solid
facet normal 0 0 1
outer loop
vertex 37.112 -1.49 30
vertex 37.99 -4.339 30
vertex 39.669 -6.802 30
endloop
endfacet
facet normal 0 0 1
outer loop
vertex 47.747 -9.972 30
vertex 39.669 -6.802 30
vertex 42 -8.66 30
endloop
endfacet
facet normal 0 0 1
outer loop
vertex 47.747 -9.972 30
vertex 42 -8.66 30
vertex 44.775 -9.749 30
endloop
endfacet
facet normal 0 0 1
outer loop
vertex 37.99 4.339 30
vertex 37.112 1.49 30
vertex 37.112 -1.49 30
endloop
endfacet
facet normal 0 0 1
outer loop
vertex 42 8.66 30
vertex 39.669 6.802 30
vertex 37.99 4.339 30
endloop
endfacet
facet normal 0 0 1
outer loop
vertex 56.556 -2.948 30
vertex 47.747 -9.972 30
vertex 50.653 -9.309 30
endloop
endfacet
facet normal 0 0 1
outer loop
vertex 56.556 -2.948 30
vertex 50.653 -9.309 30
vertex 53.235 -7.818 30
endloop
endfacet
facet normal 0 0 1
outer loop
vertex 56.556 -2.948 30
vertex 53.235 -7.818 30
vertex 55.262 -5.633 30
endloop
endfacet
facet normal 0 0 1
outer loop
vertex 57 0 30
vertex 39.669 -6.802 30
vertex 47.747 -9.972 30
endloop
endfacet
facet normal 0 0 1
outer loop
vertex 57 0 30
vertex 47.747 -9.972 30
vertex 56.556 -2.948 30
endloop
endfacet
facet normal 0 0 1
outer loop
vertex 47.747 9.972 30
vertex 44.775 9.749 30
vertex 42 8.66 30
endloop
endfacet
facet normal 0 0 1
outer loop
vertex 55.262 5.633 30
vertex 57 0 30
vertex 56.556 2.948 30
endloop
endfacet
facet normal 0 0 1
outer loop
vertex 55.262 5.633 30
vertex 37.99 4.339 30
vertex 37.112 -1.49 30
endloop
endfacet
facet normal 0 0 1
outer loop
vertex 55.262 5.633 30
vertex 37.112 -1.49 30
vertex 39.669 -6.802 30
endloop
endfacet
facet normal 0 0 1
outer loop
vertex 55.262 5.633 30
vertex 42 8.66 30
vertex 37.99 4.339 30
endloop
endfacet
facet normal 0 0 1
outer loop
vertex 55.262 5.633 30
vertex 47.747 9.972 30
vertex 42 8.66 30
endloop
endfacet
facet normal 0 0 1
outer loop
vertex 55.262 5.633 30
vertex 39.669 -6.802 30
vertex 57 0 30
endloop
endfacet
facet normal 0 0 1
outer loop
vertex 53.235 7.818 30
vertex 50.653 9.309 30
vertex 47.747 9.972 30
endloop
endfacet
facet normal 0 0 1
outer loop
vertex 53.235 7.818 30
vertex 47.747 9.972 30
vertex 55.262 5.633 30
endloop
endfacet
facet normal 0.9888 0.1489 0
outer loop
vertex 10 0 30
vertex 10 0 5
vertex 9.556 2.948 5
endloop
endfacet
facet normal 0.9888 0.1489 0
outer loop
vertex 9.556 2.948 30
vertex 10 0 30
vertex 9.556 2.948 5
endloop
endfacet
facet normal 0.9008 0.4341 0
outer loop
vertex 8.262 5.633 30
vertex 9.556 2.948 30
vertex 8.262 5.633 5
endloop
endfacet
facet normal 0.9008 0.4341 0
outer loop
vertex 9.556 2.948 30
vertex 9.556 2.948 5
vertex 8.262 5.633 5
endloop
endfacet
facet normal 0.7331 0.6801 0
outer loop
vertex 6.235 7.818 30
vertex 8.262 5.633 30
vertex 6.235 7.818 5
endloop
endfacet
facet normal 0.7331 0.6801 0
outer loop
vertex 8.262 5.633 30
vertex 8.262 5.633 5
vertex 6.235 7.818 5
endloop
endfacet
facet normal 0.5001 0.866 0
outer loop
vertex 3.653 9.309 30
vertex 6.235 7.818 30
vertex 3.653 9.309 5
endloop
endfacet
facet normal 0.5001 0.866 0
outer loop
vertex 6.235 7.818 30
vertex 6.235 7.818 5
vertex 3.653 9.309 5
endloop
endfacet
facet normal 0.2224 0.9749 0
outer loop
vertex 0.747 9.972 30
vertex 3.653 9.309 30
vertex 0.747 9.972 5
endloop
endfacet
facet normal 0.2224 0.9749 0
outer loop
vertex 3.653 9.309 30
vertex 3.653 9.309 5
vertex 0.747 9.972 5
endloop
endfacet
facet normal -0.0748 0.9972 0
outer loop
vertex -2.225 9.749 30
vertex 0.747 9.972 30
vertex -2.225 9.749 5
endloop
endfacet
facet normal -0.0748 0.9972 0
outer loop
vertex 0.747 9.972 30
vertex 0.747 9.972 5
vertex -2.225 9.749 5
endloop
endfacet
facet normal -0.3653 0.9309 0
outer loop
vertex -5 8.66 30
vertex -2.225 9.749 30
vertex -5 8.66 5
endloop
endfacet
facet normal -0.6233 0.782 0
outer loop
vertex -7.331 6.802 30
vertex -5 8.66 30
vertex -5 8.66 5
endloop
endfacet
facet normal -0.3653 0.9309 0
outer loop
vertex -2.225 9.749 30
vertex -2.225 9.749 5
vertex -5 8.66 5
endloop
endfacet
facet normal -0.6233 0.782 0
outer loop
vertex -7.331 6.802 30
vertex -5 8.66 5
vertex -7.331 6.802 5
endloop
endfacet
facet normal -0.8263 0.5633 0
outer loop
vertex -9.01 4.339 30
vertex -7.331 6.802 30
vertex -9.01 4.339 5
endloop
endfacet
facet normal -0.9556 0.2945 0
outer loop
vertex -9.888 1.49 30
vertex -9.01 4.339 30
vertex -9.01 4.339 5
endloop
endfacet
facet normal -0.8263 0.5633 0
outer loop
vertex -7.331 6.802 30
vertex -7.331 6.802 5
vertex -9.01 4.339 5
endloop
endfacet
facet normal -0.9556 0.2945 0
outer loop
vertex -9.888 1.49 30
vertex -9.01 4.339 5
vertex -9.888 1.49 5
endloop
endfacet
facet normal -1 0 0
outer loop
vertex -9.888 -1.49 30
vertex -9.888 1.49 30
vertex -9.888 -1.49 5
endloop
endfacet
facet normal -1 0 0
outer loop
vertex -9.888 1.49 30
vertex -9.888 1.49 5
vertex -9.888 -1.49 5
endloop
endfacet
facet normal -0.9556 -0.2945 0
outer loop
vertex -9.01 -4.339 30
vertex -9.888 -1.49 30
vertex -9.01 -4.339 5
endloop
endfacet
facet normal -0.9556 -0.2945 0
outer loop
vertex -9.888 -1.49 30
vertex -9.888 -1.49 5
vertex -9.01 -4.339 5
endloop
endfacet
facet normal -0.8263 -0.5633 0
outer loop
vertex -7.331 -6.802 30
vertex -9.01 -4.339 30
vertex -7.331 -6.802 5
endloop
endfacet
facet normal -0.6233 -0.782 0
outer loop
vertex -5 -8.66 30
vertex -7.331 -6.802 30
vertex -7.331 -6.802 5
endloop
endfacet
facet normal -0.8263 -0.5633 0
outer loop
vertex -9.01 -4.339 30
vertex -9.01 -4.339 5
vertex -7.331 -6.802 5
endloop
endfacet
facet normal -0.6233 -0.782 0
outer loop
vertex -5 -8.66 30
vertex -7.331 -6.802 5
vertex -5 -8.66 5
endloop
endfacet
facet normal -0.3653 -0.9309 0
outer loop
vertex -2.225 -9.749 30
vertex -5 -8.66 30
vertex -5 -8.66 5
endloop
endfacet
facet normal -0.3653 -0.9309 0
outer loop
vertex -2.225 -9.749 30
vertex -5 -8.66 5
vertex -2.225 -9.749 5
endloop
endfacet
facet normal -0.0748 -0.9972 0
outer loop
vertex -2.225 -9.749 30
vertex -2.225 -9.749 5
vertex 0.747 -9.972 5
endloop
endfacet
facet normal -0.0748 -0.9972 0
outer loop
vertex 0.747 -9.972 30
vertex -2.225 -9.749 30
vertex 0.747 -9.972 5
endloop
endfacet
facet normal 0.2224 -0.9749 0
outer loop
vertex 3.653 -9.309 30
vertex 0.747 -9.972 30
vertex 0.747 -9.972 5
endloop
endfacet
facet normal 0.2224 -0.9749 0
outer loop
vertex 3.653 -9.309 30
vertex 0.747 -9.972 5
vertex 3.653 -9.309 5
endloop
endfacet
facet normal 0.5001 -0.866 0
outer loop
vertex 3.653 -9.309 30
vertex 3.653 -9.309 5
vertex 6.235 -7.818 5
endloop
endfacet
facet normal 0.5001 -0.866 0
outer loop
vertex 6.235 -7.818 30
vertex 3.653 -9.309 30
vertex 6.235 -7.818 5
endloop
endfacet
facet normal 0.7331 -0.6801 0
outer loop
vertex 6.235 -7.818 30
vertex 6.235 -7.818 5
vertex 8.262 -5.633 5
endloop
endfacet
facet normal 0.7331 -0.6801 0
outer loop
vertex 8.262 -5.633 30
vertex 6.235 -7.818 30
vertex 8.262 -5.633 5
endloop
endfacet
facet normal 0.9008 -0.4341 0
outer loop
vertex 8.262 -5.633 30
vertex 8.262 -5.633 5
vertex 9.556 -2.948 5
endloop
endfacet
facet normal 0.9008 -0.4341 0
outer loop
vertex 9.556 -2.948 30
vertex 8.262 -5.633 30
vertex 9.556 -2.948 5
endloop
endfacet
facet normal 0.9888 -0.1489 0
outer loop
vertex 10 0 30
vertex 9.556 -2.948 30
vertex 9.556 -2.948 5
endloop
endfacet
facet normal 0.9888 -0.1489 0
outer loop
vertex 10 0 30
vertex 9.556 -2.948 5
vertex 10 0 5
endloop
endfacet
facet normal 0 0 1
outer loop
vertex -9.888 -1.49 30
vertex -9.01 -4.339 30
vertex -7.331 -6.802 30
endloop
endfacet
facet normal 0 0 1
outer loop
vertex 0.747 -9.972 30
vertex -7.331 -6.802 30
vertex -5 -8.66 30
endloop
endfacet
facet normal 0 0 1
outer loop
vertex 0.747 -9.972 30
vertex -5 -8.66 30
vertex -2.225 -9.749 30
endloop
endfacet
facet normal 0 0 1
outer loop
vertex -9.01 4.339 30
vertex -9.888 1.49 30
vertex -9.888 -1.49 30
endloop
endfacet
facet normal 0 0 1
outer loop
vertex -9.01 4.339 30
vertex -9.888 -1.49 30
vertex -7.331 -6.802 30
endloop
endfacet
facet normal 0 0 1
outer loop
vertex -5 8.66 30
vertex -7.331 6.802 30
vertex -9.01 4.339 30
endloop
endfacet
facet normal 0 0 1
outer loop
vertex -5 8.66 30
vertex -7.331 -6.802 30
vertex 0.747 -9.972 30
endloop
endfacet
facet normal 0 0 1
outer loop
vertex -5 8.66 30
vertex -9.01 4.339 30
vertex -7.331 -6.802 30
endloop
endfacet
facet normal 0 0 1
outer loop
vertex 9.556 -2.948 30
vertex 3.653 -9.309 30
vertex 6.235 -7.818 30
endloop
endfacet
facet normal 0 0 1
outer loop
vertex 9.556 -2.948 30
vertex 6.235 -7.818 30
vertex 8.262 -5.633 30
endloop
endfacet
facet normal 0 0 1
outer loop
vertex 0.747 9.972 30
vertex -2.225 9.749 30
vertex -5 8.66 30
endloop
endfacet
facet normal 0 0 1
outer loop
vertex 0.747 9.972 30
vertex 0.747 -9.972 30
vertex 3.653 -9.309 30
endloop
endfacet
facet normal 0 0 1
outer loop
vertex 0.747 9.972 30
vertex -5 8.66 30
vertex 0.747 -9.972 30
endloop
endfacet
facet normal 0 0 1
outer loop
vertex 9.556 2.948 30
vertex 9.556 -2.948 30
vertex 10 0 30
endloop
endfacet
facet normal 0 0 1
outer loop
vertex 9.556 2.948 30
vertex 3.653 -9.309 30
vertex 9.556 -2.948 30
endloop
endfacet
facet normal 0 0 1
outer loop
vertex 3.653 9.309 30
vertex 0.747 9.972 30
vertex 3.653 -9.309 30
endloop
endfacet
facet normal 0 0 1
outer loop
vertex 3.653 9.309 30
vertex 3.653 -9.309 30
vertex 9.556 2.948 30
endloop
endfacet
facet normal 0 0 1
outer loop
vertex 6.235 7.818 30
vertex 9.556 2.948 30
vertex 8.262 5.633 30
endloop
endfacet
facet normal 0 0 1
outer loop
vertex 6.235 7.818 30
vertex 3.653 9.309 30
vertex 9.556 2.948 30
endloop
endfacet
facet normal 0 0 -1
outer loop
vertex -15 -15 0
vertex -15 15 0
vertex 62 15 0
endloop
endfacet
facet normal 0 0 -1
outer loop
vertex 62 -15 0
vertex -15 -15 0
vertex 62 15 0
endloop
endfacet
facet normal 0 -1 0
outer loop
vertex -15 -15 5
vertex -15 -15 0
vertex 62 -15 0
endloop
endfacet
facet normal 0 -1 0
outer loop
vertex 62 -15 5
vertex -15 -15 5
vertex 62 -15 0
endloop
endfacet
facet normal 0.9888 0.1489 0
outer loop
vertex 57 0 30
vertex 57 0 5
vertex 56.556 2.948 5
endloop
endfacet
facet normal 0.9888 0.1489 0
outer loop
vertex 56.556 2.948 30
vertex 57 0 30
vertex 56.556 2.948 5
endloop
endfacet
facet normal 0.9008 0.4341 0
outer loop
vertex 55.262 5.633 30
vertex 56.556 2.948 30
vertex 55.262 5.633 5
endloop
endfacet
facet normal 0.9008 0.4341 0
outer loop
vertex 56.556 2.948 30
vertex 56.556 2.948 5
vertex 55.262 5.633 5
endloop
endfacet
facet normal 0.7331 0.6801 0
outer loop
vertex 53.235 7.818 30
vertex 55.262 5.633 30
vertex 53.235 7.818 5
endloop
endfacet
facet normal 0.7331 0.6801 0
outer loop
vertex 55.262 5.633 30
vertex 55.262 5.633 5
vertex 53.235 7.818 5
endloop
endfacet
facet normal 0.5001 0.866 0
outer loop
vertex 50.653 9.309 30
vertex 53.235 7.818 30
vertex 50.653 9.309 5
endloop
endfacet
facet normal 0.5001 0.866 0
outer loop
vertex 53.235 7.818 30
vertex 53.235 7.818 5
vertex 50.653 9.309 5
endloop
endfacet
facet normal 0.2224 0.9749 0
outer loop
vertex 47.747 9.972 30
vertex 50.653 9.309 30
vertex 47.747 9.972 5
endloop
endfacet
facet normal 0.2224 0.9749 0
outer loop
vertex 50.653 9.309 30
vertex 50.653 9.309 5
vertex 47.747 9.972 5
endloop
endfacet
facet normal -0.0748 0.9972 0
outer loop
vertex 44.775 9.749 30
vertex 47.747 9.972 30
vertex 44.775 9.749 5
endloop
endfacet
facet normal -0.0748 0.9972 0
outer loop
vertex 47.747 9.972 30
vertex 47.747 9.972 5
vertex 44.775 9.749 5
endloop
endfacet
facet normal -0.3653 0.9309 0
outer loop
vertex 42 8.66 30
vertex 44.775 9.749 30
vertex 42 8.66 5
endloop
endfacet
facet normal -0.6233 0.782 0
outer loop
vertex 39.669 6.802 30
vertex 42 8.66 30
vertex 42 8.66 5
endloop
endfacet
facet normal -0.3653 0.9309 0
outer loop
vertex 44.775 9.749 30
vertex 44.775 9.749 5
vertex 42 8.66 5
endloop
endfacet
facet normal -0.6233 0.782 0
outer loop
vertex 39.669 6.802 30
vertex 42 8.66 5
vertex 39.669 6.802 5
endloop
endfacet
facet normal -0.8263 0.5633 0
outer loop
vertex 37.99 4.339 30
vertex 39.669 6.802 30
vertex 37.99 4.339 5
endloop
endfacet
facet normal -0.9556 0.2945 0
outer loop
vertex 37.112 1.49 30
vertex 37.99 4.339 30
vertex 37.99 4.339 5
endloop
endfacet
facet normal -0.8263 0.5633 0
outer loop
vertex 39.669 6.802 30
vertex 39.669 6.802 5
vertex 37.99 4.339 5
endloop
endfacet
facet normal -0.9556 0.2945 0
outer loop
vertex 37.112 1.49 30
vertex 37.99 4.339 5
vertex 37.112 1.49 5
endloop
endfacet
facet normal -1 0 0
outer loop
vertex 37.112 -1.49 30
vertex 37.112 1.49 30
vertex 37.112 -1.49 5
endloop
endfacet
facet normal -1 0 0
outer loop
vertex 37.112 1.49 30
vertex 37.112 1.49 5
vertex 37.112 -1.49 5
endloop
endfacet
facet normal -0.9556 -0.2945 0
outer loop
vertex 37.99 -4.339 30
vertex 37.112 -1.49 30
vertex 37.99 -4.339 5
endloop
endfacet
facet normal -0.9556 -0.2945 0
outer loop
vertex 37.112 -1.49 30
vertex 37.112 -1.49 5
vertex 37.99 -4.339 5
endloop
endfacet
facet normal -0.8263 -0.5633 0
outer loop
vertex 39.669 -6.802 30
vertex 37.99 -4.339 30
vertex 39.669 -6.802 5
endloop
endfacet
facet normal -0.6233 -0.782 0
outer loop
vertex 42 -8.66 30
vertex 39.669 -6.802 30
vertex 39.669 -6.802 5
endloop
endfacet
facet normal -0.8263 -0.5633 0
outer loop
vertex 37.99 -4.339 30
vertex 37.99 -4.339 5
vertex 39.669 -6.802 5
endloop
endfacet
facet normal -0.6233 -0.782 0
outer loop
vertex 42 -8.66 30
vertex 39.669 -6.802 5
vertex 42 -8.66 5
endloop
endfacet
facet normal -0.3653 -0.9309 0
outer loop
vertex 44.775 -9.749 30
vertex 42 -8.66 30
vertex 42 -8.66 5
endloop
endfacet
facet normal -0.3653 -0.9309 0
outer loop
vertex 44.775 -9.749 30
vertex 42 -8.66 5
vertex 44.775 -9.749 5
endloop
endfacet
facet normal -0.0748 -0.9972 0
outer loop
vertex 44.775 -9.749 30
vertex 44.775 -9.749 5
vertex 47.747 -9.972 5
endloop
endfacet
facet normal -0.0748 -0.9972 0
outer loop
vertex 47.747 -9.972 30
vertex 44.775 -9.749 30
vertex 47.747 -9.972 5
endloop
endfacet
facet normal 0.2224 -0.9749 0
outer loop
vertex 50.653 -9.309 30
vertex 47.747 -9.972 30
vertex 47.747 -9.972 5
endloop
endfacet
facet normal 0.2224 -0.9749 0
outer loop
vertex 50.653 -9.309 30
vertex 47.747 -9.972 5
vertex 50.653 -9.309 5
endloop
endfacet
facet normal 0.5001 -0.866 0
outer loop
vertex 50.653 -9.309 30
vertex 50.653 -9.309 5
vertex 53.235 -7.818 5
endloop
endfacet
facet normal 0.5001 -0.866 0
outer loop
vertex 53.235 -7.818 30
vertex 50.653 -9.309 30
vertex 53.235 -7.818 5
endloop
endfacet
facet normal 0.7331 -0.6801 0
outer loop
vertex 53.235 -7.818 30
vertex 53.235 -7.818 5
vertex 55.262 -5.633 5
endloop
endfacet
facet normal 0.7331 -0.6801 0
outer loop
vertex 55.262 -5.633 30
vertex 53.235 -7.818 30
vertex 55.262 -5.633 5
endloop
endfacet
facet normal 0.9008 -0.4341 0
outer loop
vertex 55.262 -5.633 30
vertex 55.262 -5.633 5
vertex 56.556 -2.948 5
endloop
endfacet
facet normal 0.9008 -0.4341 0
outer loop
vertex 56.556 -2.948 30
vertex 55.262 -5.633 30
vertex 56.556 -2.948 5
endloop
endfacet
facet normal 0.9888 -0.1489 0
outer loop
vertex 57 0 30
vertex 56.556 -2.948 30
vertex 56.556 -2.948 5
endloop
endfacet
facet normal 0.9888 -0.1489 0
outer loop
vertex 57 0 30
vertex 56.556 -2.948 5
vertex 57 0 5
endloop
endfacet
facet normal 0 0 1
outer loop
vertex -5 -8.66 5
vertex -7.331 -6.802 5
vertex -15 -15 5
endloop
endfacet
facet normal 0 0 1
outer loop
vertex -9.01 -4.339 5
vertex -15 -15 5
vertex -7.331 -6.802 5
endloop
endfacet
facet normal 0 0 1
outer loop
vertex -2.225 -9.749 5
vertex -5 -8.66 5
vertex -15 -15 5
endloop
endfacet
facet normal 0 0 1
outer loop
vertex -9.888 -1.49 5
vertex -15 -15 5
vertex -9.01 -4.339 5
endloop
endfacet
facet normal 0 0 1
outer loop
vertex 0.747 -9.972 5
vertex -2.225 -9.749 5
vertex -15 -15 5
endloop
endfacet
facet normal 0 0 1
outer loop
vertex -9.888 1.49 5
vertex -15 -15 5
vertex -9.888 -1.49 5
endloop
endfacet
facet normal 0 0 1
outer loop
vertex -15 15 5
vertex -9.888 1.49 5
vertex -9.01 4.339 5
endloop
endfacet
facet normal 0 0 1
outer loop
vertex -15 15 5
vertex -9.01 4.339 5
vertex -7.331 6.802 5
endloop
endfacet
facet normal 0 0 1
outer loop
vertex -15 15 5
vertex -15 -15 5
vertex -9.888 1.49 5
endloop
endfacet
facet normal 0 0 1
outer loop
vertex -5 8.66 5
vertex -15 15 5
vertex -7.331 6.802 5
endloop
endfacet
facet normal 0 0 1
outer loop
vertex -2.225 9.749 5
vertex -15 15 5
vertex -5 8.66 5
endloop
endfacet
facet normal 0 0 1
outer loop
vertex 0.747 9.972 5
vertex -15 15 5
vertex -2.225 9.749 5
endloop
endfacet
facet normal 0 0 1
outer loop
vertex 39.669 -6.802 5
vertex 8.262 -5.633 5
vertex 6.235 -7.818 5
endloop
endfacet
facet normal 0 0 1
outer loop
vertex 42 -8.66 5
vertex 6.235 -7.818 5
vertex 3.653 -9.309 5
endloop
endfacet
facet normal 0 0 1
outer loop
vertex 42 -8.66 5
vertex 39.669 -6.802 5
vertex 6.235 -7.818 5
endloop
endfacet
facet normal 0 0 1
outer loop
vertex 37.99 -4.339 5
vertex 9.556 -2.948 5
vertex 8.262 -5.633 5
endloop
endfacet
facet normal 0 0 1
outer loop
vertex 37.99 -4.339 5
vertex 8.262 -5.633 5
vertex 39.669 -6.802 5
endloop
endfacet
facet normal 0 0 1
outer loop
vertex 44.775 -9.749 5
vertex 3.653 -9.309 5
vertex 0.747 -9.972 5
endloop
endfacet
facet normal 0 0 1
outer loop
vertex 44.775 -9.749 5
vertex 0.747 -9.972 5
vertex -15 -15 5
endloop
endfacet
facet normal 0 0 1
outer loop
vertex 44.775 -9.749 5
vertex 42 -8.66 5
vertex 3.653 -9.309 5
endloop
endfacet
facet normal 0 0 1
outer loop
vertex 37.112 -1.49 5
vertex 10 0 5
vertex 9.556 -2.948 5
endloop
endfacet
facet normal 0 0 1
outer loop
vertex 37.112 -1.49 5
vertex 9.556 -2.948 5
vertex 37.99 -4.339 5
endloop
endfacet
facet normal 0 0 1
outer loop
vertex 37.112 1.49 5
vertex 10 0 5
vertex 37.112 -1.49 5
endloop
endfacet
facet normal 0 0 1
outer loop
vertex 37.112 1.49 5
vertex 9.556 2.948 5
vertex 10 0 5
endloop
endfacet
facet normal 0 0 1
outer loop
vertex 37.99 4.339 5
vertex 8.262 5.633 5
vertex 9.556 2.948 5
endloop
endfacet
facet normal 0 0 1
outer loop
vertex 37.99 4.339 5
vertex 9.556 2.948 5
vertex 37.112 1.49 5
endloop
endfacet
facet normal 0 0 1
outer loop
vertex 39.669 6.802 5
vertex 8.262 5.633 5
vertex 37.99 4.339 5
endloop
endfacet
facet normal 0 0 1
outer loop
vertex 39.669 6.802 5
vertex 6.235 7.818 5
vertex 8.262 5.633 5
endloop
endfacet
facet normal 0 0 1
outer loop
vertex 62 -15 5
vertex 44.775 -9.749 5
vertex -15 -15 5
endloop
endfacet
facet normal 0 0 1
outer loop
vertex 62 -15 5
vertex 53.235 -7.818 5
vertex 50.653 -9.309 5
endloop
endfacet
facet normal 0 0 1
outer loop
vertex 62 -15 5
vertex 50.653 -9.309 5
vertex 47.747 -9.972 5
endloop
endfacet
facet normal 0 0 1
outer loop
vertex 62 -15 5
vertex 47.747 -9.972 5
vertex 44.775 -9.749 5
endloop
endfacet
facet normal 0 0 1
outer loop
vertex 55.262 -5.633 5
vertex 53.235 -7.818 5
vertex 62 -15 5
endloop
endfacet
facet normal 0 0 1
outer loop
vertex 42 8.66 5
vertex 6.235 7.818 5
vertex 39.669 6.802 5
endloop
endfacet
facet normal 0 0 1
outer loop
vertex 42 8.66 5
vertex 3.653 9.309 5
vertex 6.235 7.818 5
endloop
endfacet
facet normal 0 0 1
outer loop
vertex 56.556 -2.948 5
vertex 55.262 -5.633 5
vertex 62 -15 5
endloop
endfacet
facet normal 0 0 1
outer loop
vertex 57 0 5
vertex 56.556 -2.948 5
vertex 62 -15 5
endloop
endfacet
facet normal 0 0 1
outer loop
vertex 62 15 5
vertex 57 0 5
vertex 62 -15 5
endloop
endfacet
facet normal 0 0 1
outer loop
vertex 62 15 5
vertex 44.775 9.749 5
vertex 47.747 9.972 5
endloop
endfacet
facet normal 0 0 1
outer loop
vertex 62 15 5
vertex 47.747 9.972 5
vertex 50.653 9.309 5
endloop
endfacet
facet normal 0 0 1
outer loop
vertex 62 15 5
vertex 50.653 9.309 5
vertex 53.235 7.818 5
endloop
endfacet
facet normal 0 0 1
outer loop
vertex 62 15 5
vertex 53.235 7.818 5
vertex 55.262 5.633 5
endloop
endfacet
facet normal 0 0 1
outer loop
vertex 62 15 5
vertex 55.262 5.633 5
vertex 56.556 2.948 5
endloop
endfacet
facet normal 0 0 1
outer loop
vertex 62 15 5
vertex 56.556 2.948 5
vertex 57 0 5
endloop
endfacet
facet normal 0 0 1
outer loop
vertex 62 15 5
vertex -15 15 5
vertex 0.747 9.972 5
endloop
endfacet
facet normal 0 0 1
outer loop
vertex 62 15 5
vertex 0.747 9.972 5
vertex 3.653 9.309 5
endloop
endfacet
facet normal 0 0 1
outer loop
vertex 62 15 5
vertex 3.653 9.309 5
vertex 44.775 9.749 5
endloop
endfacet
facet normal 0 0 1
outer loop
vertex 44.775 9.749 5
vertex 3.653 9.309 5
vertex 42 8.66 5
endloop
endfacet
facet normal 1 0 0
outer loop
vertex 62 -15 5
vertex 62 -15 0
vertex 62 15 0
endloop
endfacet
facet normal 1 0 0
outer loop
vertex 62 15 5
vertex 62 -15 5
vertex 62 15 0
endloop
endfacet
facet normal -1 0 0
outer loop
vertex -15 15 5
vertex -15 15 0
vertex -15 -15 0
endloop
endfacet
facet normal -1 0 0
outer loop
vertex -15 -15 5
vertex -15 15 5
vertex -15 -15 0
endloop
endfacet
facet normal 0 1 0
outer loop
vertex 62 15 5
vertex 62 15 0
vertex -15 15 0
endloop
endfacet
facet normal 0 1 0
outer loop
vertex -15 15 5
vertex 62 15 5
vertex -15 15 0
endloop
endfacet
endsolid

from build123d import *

# Parameters (mm, degrees)
F2_DEPTH = 5
F3_DEPTH = 30


with BuildPart() as f2:
    # F0 (on Top) → F2 (new body)
    with BuildSketch(Plane.XY):
        with BuildLine():
            ThreePointArc((-10, 0), (0, 10), (10, 0))
            Line((10, 0), (37, 0))
            ThreePointArc((37, 0), (47, 10), (57, 0))
            Line((57, 0), (62, 0))
            Line((62, 0), (62, 15))
            Line((62, 15), (-15, 15))
            Line((-15, 15), (-15, 0))
            Line((-15, 0), (-10, 0))
        make_face()
        with BuildLine():
            Line((37, 0), (10, 0))
            ThreePointArc((10, 0), (0, -10), (-10, 0))
            Line((-10, 0), (-15, 0))
            Line((-15, 0), (-15, -15))
            Line((-15, -15), (62, -15))
            Line((62, -15), (62, 0))
            Line((62, 0), (57, 0))
            ThreePointArc((57, 0), (47, -10), (37, 0))
        make_face()
    extrude(amount=F2_DEPTH)

    # F0 (on Top) → F3 (join)
    with BuildSketch(Plane.XY):
        with BuildLine():
            ThreePointArc((-10, 0), (0, -10), (10, 0))
            Line((10, 0), (0, 0))
            Line((0, 0), (-10, 0))
        make_face()
        with BuildLine():
            Line((0, 0), (10, 0))
            ThreePointArc((10, 0), (0, 10), (-10, 0))
            Line((-10, 0), (0, 0))
        make_face()
        with BuildLine():
            Line((47, 0), (37, 0))
            ThreePointArc((37, 0), (47, -10), (57, 0))
            Line((57, 0), (47, 0))
        make_face()
        with BuildLine():
            ThreePointArc((57, 0), (47, 10), (37, 0))
            Line((37, 0), (47, 0))
            Line((47, 0), (57, 0))
        make_face()
    extrude(amount=F3_DEPTH)


solid = f2.part
